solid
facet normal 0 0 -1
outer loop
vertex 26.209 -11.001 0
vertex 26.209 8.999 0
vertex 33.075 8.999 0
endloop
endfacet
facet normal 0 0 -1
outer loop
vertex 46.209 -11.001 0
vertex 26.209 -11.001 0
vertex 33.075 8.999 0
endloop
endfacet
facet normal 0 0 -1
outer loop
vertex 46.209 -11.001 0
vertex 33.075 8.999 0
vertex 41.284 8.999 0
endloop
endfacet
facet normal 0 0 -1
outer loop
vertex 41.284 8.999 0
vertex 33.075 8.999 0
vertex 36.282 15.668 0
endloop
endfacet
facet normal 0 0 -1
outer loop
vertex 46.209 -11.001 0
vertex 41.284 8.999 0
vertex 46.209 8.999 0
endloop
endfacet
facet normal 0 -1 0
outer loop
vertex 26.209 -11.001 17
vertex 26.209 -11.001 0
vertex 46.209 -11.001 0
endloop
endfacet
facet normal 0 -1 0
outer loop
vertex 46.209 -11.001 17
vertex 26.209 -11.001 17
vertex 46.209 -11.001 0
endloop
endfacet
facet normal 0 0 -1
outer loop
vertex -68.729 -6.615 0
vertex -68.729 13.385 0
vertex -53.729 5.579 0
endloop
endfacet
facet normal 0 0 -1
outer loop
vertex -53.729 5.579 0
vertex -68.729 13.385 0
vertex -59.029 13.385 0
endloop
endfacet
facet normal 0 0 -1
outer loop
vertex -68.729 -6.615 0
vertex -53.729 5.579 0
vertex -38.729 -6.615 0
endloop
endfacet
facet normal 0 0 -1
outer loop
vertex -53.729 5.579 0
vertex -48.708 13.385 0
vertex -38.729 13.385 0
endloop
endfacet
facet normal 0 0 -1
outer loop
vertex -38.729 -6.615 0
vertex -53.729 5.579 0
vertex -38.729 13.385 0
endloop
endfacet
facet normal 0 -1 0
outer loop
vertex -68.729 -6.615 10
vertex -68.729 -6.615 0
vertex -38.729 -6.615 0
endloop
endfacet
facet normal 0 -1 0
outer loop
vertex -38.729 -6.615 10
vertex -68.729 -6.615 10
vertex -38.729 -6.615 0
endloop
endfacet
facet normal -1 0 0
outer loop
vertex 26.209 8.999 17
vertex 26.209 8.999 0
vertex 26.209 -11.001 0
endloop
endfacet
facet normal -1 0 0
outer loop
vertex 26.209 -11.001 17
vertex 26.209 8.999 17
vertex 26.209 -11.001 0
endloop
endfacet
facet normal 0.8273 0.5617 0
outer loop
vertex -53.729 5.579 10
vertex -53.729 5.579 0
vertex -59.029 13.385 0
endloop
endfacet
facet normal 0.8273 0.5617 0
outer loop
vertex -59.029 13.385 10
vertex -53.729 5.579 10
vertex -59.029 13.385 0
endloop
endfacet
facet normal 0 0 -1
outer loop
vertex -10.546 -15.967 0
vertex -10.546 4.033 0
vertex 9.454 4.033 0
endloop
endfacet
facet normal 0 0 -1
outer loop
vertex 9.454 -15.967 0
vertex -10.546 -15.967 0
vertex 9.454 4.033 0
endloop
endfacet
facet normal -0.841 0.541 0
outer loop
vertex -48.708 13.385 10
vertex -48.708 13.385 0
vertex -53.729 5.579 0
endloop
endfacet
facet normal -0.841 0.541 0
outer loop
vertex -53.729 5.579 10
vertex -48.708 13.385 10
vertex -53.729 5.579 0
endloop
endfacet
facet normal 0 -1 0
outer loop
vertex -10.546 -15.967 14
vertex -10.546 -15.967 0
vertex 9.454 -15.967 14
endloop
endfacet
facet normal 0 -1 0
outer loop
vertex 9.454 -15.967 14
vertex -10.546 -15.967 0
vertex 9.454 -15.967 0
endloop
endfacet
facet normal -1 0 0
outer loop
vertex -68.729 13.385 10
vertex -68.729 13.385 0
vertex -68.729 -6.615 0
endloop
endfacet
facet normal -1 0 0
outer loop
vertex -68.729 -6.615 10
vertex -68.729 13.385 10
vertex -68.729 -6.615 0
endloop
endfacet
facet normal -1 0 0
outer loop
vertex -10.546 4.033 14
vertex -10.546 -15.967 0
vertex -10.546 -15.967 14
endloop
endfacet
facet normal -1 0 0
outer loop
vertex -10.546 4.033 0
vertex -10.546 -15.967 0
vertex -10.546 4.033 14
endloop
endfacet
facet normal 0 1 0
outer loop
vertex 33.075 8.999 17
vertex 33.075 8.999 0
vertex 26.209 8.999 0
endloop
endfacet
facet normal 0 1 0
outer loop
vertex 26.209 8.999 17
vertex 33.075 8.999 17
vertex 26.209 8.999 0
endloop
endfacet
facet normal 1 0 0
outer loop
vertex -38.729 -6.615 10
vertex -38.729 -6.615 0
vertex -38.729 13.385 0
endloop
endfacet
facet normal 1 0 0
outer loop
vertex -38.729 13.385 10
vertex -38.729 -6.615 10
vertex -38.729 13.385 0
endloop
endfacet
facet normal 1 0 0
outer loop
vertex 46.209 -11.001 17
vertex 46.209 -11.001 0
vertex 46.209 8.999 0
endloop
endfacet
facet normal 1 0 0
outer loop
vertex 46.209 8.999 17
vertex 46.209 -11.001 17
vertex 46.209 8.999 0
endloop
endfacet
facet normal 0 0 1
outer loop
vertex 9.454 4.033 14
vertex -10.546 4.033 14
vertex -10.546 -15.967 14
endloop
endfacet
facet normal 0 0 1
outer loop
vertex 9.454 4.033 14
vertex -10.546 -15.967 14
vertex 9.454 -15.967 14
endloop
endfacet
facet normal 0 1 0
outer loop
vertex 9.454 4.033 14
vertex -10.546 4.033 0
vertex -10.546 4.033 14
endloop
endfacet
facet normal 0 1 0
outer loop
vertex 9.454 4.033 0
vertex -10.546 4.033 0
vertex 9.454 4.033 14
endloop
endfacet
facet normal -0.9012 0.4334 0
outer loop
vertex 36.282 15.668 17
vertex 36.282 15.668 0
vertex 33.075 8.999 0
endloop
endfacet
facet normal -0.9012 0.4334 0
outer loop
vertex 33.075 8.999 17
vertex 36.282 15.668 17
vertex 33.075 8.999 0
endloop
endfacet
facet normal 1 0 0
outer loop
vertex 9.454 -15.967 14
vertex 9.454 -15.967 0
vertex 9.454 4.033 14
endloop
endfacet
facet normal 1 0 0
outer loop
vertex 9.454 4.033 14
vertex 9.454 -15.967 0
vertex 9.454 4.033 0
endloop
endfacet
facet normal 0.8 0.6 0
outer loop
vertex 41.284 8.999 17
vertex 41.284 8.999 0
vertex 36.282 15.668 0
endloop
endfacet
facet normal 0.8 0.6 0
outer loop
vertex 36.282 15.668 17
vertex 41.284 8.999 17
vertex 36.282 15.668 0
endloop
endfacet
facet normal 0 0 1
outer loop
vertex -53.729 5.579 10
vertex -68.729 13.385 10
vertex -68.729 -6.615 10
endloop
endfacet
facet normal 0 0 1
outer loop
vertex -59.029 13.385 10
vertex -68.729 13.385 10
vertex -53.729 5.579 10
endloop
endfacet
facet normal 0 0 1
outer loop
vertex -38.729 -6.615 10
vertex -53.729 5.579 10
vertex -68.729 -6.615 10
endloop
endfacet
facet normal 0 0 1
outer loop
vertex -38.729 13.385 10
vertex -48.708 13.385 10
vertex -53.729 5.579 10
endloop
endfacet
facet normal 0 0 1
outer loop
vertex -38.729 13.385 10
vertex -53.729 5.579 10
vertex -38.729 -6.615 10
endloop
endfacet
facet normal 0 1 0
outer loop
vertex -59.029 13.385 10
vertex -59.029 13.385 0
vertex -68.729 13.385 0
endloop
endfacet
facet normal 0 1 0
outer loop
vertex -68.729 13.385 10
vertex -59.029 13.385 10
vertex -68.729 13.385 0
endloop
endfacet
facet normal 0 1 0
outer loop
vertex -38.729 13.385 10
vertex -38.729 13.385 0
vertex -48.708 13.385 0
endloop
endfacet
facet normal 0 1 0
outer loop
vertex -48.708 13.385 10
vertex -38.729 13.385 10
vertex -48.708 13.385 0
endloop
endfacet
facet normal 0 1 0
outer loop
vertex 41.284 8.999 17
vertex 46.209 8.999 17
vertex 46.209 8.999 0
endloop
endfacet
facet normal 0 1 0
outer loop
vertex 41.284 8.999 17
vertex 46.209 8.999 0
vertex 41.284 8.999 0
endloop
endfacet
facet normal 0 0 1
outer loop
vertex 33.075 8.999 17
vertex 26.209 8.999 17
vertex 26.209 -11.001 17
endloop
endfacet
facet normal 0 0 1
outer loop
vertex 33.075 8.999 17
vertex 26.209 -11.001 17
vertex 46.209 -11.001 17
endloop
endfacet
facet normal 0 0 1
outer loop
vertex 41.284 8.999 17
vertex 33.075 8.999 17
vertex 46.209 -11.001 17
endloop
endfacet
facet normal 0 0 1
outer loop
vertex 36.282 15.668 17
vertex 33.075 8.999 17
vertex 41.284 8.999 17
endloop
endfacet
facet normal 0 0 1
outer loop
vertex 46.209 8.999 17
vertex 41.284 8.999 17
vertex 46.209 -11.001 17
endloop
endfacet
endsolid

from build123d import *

# Parameters (mm, degrees)
F0_W     = 20
F0_H     = 20
F1_DEPTH = 14
F3_DEPTH = 17
F5_DEPTH = 10


with BuildPart() as f1:
    # F0 (on Top) → F1 (new body)
    with BuildSketch(Plane.XY):
        with Locations((-0.545902, -5.967321)):
            Rectangle(F0_W, F0_H)
    extrude(amount=F1_DEPTH)


with BuildPart() as f3:
    # F2 (on Top) → F3 (new body)
    with BuildSketch(Plane.XY):
        Polygon((33.074808, 8.999499), (26.208911, 8.999499), (26.208911, -11.000501), (46.208911, -11.000501), (46.208911, 8.999499), (41.28367, 8.999499), (36.282495, 15.667995), align=None)
    extrude(amount=F3_DEPTH)


with BuildPart() as f5:
    # F4 (on Top) → F5 (new body)
    with BuildSketch(Plane.XY):
        Polygon((-59.02863, 13.385359), (-68.729437, 13.385359), (-68.729437, -6.614641), (-38.729437, -6.614641), (-38.729437, 13.385359), (-48.708464, 13.385359), (-53.729437, 5.57876), align=None)
    extrude(amount=F5_DEPTH)


solid = Compound([f1.part, f3.part, f5.part])
